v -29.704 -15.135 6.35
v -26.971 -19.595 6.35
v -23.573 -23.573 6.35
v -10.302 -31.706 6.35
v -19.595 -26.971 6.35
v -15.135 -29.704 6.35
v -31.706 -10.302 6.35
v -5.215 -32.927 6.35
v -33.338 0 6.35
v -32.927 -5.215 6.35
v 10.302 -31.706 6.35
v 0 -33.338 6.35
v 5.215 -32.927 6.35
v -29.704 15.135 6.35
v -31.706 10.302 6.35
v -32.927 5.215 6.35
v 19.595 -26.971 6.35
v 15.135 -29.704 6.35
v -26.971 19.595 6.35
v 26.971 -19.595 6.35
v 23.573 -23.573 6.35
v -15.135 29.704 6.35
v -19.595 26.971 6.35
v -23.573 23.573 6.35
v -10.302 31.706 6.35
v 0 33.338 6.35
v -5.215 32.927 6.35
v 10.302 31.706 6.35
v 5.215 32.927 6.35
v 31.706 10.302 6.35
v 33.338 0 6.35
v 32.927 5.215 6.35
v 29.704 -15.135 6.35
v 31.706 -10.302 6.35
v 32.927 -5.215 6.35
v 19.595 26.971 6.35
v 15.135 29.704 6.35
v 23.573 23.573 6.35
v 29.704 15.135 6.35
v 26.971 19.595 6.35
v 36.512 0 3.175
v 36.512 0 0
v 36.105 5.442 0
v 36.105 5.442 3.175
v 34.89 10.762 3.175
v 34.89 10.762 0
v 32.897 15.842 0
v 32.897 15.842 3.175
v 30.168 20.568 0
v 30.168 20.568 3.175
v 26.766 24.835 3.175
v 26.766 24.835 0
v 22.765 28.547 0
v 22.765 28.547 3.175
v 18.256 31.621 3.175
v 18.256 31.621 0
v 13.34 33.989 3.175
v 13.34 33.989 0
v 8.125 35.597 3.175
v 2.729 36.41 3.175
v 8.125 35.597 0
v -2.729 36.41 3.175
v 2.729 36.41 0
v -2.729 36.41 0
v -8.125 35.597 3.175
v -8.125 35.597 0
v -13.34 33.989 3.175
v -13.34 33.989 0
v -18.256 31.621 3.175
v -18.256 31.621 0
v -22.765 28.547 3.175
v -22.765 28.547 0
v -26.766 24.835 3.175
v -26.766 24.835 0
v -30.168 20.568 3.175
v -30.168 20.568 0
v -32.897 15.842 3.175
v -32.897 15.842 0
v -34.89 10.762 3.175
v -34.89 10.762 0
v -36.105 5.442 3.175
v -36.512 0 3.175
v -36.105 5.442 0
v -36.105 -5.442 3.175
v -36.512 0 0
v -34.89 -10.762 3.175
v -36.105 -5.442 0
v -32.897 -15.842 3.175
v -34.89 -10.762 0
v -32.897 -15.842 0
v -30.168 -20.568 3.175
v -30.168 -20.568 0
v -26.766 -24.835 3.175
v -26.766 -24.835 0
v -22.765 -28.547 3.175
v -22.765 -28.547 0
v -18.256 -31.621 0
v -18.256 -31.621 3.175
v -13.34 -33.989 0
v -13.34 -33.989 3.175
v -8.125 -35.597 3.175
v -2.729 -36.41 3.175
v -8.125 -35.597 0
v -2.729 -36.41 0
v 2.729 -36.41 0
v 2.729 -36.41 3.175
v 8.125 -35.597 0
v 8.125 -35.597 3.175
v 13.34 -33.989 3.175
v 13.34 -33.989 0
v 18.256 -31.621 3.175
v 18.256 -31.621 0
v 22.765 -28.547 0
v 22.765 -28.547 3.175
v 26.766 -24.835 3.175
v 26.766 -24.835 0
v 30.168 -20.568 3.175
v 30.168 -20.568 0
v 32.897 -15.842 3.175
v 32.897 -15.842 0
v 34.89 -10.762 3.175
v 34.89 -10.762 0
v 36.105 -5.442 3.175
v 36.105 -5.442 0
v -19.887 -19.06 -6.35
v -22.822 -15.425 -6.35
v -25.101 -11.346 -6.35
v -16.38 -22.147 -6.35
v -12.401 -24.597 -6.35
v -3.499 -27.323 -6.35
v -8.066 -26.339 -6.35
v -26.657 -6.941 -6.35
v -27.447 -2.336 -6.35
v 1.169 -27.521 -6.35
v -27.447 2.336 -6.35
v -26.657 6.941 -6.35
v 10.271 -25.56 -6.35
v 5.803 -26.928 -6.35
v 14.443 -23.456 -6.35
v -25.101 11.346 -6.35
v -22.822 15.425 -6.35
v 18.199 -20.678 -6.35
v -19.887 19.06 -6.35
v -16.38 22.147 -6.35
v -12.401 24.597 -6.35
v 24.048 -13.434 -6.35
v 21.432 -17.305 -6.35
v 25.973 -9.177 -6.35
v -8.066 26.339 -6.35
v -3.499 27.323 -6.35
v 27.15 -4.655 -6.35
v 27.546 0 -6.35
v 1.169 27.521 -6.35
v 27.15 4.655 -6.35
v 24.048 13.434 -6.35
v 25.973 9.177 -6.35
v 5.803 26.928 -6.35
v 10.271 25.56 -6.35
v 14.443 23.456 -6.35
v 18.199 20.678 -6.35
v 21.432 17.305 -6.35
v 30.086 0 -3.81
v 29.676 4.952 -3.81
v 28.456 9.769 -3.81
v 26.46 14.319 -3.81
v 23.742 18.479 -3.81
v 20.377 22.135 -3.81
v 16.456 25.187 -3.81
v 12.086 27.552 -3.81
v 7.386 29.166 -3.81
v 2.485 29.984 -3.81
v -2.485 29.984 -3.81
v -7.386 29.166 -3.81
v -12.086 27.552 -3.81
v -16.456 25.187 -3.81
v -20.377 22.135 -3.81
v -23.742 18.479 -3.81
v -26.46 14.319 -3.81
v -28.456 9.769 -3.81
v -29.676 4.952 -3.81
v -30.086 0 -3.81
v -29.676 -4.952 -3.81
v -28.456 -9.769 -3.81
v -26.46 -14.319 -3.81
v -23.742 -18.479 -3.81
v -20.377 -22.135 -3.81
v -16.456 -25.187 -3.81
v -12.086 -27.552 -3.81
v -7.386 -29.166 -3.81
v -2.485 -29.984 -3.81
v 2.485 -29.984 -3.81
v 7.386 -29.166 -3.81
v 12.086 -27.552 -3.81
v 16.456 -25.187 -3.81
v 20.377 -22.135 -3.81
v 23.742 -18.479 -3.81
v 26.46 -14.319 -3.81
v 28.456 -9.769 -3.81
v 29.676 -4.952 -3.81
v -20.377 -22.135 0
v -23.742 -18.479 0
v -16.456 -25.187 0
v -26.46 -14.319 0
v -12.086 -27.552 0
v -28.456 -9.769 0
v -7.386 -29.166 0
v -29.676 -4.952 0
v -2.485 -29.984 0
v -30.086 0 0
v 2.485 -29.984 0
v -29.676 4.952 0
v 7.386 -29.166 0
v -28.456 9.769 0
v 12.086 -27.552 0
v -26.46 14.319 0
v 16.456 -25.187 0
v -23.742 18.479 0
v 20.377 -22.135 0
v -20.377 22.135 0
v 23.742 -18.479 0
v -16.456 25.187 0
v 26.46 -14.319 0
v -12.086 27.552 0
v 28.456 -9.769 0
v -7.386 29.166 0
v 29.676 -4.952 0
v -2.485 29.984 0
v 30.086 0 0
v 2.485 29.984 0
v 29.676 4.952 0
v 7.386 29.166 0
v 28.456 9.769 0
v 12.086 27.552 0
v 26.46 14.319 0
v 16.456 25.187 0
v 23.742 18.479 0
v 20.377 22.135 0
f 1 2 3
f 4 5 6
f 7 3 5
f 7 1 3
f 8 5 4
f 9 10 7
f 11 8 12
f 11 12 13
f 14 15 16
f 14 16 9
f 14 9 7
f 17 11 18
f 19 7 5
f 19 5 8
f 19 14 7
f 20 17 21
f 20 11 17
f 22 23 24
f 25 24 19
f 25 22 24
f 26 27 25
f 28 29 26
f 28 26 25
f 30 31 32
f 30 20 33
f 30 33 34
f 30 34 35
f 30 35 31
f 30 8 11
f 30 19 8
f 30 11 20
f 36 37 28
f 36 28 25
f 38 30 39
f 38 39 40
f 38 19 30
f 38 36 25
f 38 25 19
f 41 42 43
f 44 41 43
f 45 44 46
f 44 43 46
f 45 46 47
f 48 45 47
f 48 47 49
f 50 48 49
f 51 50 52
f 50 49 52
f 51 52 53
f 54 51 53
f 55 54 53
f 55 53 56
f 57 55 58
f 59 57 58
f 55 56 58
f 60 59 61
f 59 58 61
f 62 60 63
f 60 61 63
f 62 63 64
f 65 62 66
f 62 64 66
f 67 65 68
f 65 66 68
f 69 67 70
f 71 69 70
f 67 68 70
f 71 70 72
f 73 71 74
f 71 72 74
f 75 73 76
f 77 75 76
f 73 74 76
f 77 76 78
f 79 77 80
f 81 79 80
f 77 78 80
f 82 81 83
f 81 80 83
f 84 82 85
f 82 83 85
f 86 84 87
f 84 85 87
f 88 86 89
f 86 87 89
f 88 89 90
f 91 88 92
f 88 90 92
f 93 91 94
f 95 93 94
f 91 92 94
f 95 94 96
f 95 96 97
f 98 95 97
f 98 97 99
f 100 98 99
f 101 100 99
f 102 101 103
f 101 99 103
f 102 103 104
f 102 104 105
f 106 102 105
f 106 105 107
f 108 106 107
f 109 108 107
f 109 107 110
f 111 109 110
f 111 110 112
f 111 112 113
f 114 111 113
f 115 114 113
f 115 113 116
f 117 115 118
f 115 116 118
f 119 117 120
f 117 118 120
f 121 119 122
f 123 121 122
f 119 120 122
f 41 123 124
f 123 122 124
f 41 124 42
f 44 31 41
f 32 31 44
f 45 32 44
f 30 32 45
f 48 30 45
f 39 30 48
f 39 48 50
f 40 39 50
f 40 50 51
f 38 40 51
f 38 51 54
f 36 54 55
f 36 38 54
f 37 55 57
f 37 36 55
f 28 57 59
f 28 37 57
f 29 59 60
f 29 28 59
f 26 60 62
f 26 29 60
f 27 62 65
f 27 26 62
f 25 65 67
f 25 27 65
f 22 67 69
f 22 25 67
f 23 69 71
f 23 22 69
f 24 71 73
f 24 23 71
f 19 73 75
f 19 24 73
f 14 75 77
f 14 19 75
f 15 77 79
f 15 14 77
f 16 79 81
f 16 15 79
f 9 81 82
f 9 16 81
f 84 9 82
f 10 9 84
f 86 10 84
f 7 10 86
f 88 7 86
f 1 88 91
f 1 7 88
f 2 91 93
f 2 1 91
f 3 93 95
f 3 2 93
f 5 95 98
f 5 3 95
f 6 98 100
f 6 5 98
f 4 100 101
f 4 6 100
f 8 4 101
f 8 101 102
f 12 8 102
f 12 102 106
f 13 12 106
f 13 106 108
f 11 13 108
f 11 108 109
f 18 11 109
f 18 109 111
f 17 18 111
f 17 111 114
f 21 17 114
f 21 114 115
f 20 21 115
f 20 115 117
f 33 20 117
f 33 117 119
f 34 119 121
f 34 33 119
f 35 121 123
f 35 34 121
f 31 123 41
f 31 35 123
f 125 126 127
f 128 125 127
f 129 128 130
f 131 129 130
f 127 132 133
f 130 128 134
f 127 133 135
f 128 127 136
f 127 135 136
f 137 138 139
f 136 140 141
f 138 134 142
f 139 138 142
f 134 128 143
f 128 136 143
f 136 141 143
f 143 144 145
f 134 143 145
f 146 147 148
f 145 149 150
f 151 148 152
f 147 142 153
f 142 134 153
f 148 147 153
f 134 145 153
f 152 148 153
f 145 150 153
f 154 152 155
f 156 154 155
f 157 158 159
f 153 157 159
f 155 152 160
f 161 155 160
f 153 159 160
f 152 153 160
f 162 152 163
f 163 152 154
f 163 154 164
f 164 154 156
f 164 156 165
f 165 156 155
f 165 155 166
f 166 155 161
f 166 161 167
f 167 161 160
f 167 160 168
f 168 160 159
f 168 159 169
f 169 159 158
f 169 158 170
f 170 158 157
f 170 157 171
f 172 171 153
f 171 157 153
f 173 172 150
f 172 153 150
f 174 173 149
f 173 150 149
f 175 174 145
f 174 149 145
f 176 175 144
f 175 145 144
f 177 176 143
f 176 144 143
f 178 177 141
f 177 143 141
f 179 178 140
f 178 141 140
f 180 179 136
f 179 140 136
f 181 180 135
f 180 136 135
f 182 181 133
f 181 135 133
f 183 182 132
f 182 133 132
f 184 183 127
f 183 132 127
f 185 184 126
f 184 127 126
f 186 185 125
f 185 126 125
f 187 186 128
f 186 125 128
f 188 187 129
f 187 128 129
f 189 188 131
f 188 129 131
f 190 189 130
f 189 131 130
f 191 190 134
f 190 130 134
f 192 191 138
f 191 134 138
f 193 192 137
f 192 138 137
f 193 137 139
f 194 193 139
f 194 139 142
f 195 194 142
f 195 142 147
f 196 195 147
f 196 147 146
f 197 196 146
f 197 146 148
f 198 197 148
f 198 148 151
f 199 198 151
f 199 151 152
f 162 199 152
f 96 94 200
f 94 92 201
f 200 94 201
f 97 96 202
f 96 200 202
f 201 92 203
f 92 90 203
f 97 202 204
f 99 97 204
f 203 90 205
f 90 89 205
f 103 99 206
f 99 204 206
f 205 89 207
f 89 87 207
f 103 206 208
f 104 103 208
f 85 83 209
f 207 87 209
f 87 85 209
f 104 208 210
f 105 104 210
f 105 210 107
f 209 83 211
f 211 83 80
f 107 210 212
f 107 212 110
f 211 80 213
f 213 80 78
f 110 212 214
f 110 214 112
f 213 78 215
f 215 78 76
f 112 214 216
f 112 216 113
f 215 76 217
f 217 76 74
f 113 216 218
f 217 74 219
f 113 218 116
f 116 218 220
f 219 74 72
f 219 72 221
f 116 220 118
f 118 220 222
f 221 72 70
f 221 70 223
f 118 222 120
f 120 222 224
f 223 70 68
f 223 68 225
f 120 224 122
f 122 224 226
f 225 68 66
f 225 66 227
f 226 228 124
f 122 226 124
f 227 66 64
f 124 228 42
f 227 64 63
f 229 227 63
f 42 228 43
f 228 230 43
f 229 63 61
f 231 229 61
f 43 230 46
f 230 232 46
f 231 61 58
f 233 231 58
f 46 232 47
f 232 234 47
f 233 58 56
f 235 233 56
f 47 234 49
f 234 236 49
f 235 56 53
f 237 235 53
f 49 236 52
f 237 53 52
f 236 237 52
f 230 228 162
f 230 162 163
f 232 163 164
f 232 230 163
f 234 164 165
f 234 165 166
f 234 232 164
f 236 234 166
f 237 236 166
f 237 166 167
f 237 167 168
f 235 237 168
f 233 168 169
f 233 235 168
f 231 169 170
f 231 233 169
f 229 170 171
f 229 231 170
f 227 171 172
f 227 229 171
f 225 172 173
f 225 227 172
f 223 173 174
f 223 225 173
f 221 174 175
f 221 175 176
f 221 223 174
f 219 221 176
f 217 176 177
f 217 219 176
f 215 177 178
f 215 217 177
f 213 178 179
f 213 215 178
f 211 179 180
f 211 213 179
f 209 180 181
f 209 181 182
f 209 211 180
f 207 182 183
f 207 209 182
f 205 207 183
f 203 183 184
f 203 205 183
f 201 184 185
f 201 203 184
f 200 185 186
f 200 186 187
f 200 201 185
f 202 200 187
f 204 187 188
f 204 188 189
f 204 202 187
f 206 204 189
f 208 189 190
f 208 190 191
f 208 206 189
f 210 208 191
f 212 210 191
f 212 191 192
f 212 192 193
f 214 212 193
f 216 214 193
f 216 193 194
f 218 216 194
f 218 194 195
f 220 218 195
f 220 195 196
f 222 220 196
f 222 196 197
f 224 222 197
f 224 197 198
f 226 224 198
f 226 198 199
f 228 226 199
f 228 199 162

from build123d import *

# Parameters (mm, degrees)
SKETCH1_R           = 30.0863
BOSS_EXTRUDE1_DEPTH = 6.35
SKETCH2_R           = 36.5125
BOSS_EXTRUDE2_DEPTH = 6.35
CHAMFER1_SIZE       = 3.175
CHAMFER2_SIZE       = 2.54


with BuildPart() as part:
    # Sketch1 → Boss-Extrude1 (new body)
    with BuildSketch(Plane.XY):
        Circle(SKETCH1_R)
    extrude(amount=-BOSS_EXTRUDE1_DEPTH)

    # Sketch2 → Boss-Extrude2 (add)
    with BuildSketch(Plane.XY):
        Circle(SKETCH2_R)
    extrude(amount=BOSS_EXTRUDE2_DEPTH)

    # Chamfer1
    chamfer1_edges = [part.edges().sort_by_distance(p)[0] for p in [
        (-36.5125, 0, 6.35),
    ]]
    chamfer(chamfer1_edges, length=CHAMFER1_SIZE)

    # Chamfer2
    chamfer2_edges = [part.edges().sort_by_distance(p)[0] for p in [
        (-30.0863, 0, -6.35),
    ]]
    chamfer(chamfer2_edges, length=CHAMFER2_SIZE)


solid = part.part
